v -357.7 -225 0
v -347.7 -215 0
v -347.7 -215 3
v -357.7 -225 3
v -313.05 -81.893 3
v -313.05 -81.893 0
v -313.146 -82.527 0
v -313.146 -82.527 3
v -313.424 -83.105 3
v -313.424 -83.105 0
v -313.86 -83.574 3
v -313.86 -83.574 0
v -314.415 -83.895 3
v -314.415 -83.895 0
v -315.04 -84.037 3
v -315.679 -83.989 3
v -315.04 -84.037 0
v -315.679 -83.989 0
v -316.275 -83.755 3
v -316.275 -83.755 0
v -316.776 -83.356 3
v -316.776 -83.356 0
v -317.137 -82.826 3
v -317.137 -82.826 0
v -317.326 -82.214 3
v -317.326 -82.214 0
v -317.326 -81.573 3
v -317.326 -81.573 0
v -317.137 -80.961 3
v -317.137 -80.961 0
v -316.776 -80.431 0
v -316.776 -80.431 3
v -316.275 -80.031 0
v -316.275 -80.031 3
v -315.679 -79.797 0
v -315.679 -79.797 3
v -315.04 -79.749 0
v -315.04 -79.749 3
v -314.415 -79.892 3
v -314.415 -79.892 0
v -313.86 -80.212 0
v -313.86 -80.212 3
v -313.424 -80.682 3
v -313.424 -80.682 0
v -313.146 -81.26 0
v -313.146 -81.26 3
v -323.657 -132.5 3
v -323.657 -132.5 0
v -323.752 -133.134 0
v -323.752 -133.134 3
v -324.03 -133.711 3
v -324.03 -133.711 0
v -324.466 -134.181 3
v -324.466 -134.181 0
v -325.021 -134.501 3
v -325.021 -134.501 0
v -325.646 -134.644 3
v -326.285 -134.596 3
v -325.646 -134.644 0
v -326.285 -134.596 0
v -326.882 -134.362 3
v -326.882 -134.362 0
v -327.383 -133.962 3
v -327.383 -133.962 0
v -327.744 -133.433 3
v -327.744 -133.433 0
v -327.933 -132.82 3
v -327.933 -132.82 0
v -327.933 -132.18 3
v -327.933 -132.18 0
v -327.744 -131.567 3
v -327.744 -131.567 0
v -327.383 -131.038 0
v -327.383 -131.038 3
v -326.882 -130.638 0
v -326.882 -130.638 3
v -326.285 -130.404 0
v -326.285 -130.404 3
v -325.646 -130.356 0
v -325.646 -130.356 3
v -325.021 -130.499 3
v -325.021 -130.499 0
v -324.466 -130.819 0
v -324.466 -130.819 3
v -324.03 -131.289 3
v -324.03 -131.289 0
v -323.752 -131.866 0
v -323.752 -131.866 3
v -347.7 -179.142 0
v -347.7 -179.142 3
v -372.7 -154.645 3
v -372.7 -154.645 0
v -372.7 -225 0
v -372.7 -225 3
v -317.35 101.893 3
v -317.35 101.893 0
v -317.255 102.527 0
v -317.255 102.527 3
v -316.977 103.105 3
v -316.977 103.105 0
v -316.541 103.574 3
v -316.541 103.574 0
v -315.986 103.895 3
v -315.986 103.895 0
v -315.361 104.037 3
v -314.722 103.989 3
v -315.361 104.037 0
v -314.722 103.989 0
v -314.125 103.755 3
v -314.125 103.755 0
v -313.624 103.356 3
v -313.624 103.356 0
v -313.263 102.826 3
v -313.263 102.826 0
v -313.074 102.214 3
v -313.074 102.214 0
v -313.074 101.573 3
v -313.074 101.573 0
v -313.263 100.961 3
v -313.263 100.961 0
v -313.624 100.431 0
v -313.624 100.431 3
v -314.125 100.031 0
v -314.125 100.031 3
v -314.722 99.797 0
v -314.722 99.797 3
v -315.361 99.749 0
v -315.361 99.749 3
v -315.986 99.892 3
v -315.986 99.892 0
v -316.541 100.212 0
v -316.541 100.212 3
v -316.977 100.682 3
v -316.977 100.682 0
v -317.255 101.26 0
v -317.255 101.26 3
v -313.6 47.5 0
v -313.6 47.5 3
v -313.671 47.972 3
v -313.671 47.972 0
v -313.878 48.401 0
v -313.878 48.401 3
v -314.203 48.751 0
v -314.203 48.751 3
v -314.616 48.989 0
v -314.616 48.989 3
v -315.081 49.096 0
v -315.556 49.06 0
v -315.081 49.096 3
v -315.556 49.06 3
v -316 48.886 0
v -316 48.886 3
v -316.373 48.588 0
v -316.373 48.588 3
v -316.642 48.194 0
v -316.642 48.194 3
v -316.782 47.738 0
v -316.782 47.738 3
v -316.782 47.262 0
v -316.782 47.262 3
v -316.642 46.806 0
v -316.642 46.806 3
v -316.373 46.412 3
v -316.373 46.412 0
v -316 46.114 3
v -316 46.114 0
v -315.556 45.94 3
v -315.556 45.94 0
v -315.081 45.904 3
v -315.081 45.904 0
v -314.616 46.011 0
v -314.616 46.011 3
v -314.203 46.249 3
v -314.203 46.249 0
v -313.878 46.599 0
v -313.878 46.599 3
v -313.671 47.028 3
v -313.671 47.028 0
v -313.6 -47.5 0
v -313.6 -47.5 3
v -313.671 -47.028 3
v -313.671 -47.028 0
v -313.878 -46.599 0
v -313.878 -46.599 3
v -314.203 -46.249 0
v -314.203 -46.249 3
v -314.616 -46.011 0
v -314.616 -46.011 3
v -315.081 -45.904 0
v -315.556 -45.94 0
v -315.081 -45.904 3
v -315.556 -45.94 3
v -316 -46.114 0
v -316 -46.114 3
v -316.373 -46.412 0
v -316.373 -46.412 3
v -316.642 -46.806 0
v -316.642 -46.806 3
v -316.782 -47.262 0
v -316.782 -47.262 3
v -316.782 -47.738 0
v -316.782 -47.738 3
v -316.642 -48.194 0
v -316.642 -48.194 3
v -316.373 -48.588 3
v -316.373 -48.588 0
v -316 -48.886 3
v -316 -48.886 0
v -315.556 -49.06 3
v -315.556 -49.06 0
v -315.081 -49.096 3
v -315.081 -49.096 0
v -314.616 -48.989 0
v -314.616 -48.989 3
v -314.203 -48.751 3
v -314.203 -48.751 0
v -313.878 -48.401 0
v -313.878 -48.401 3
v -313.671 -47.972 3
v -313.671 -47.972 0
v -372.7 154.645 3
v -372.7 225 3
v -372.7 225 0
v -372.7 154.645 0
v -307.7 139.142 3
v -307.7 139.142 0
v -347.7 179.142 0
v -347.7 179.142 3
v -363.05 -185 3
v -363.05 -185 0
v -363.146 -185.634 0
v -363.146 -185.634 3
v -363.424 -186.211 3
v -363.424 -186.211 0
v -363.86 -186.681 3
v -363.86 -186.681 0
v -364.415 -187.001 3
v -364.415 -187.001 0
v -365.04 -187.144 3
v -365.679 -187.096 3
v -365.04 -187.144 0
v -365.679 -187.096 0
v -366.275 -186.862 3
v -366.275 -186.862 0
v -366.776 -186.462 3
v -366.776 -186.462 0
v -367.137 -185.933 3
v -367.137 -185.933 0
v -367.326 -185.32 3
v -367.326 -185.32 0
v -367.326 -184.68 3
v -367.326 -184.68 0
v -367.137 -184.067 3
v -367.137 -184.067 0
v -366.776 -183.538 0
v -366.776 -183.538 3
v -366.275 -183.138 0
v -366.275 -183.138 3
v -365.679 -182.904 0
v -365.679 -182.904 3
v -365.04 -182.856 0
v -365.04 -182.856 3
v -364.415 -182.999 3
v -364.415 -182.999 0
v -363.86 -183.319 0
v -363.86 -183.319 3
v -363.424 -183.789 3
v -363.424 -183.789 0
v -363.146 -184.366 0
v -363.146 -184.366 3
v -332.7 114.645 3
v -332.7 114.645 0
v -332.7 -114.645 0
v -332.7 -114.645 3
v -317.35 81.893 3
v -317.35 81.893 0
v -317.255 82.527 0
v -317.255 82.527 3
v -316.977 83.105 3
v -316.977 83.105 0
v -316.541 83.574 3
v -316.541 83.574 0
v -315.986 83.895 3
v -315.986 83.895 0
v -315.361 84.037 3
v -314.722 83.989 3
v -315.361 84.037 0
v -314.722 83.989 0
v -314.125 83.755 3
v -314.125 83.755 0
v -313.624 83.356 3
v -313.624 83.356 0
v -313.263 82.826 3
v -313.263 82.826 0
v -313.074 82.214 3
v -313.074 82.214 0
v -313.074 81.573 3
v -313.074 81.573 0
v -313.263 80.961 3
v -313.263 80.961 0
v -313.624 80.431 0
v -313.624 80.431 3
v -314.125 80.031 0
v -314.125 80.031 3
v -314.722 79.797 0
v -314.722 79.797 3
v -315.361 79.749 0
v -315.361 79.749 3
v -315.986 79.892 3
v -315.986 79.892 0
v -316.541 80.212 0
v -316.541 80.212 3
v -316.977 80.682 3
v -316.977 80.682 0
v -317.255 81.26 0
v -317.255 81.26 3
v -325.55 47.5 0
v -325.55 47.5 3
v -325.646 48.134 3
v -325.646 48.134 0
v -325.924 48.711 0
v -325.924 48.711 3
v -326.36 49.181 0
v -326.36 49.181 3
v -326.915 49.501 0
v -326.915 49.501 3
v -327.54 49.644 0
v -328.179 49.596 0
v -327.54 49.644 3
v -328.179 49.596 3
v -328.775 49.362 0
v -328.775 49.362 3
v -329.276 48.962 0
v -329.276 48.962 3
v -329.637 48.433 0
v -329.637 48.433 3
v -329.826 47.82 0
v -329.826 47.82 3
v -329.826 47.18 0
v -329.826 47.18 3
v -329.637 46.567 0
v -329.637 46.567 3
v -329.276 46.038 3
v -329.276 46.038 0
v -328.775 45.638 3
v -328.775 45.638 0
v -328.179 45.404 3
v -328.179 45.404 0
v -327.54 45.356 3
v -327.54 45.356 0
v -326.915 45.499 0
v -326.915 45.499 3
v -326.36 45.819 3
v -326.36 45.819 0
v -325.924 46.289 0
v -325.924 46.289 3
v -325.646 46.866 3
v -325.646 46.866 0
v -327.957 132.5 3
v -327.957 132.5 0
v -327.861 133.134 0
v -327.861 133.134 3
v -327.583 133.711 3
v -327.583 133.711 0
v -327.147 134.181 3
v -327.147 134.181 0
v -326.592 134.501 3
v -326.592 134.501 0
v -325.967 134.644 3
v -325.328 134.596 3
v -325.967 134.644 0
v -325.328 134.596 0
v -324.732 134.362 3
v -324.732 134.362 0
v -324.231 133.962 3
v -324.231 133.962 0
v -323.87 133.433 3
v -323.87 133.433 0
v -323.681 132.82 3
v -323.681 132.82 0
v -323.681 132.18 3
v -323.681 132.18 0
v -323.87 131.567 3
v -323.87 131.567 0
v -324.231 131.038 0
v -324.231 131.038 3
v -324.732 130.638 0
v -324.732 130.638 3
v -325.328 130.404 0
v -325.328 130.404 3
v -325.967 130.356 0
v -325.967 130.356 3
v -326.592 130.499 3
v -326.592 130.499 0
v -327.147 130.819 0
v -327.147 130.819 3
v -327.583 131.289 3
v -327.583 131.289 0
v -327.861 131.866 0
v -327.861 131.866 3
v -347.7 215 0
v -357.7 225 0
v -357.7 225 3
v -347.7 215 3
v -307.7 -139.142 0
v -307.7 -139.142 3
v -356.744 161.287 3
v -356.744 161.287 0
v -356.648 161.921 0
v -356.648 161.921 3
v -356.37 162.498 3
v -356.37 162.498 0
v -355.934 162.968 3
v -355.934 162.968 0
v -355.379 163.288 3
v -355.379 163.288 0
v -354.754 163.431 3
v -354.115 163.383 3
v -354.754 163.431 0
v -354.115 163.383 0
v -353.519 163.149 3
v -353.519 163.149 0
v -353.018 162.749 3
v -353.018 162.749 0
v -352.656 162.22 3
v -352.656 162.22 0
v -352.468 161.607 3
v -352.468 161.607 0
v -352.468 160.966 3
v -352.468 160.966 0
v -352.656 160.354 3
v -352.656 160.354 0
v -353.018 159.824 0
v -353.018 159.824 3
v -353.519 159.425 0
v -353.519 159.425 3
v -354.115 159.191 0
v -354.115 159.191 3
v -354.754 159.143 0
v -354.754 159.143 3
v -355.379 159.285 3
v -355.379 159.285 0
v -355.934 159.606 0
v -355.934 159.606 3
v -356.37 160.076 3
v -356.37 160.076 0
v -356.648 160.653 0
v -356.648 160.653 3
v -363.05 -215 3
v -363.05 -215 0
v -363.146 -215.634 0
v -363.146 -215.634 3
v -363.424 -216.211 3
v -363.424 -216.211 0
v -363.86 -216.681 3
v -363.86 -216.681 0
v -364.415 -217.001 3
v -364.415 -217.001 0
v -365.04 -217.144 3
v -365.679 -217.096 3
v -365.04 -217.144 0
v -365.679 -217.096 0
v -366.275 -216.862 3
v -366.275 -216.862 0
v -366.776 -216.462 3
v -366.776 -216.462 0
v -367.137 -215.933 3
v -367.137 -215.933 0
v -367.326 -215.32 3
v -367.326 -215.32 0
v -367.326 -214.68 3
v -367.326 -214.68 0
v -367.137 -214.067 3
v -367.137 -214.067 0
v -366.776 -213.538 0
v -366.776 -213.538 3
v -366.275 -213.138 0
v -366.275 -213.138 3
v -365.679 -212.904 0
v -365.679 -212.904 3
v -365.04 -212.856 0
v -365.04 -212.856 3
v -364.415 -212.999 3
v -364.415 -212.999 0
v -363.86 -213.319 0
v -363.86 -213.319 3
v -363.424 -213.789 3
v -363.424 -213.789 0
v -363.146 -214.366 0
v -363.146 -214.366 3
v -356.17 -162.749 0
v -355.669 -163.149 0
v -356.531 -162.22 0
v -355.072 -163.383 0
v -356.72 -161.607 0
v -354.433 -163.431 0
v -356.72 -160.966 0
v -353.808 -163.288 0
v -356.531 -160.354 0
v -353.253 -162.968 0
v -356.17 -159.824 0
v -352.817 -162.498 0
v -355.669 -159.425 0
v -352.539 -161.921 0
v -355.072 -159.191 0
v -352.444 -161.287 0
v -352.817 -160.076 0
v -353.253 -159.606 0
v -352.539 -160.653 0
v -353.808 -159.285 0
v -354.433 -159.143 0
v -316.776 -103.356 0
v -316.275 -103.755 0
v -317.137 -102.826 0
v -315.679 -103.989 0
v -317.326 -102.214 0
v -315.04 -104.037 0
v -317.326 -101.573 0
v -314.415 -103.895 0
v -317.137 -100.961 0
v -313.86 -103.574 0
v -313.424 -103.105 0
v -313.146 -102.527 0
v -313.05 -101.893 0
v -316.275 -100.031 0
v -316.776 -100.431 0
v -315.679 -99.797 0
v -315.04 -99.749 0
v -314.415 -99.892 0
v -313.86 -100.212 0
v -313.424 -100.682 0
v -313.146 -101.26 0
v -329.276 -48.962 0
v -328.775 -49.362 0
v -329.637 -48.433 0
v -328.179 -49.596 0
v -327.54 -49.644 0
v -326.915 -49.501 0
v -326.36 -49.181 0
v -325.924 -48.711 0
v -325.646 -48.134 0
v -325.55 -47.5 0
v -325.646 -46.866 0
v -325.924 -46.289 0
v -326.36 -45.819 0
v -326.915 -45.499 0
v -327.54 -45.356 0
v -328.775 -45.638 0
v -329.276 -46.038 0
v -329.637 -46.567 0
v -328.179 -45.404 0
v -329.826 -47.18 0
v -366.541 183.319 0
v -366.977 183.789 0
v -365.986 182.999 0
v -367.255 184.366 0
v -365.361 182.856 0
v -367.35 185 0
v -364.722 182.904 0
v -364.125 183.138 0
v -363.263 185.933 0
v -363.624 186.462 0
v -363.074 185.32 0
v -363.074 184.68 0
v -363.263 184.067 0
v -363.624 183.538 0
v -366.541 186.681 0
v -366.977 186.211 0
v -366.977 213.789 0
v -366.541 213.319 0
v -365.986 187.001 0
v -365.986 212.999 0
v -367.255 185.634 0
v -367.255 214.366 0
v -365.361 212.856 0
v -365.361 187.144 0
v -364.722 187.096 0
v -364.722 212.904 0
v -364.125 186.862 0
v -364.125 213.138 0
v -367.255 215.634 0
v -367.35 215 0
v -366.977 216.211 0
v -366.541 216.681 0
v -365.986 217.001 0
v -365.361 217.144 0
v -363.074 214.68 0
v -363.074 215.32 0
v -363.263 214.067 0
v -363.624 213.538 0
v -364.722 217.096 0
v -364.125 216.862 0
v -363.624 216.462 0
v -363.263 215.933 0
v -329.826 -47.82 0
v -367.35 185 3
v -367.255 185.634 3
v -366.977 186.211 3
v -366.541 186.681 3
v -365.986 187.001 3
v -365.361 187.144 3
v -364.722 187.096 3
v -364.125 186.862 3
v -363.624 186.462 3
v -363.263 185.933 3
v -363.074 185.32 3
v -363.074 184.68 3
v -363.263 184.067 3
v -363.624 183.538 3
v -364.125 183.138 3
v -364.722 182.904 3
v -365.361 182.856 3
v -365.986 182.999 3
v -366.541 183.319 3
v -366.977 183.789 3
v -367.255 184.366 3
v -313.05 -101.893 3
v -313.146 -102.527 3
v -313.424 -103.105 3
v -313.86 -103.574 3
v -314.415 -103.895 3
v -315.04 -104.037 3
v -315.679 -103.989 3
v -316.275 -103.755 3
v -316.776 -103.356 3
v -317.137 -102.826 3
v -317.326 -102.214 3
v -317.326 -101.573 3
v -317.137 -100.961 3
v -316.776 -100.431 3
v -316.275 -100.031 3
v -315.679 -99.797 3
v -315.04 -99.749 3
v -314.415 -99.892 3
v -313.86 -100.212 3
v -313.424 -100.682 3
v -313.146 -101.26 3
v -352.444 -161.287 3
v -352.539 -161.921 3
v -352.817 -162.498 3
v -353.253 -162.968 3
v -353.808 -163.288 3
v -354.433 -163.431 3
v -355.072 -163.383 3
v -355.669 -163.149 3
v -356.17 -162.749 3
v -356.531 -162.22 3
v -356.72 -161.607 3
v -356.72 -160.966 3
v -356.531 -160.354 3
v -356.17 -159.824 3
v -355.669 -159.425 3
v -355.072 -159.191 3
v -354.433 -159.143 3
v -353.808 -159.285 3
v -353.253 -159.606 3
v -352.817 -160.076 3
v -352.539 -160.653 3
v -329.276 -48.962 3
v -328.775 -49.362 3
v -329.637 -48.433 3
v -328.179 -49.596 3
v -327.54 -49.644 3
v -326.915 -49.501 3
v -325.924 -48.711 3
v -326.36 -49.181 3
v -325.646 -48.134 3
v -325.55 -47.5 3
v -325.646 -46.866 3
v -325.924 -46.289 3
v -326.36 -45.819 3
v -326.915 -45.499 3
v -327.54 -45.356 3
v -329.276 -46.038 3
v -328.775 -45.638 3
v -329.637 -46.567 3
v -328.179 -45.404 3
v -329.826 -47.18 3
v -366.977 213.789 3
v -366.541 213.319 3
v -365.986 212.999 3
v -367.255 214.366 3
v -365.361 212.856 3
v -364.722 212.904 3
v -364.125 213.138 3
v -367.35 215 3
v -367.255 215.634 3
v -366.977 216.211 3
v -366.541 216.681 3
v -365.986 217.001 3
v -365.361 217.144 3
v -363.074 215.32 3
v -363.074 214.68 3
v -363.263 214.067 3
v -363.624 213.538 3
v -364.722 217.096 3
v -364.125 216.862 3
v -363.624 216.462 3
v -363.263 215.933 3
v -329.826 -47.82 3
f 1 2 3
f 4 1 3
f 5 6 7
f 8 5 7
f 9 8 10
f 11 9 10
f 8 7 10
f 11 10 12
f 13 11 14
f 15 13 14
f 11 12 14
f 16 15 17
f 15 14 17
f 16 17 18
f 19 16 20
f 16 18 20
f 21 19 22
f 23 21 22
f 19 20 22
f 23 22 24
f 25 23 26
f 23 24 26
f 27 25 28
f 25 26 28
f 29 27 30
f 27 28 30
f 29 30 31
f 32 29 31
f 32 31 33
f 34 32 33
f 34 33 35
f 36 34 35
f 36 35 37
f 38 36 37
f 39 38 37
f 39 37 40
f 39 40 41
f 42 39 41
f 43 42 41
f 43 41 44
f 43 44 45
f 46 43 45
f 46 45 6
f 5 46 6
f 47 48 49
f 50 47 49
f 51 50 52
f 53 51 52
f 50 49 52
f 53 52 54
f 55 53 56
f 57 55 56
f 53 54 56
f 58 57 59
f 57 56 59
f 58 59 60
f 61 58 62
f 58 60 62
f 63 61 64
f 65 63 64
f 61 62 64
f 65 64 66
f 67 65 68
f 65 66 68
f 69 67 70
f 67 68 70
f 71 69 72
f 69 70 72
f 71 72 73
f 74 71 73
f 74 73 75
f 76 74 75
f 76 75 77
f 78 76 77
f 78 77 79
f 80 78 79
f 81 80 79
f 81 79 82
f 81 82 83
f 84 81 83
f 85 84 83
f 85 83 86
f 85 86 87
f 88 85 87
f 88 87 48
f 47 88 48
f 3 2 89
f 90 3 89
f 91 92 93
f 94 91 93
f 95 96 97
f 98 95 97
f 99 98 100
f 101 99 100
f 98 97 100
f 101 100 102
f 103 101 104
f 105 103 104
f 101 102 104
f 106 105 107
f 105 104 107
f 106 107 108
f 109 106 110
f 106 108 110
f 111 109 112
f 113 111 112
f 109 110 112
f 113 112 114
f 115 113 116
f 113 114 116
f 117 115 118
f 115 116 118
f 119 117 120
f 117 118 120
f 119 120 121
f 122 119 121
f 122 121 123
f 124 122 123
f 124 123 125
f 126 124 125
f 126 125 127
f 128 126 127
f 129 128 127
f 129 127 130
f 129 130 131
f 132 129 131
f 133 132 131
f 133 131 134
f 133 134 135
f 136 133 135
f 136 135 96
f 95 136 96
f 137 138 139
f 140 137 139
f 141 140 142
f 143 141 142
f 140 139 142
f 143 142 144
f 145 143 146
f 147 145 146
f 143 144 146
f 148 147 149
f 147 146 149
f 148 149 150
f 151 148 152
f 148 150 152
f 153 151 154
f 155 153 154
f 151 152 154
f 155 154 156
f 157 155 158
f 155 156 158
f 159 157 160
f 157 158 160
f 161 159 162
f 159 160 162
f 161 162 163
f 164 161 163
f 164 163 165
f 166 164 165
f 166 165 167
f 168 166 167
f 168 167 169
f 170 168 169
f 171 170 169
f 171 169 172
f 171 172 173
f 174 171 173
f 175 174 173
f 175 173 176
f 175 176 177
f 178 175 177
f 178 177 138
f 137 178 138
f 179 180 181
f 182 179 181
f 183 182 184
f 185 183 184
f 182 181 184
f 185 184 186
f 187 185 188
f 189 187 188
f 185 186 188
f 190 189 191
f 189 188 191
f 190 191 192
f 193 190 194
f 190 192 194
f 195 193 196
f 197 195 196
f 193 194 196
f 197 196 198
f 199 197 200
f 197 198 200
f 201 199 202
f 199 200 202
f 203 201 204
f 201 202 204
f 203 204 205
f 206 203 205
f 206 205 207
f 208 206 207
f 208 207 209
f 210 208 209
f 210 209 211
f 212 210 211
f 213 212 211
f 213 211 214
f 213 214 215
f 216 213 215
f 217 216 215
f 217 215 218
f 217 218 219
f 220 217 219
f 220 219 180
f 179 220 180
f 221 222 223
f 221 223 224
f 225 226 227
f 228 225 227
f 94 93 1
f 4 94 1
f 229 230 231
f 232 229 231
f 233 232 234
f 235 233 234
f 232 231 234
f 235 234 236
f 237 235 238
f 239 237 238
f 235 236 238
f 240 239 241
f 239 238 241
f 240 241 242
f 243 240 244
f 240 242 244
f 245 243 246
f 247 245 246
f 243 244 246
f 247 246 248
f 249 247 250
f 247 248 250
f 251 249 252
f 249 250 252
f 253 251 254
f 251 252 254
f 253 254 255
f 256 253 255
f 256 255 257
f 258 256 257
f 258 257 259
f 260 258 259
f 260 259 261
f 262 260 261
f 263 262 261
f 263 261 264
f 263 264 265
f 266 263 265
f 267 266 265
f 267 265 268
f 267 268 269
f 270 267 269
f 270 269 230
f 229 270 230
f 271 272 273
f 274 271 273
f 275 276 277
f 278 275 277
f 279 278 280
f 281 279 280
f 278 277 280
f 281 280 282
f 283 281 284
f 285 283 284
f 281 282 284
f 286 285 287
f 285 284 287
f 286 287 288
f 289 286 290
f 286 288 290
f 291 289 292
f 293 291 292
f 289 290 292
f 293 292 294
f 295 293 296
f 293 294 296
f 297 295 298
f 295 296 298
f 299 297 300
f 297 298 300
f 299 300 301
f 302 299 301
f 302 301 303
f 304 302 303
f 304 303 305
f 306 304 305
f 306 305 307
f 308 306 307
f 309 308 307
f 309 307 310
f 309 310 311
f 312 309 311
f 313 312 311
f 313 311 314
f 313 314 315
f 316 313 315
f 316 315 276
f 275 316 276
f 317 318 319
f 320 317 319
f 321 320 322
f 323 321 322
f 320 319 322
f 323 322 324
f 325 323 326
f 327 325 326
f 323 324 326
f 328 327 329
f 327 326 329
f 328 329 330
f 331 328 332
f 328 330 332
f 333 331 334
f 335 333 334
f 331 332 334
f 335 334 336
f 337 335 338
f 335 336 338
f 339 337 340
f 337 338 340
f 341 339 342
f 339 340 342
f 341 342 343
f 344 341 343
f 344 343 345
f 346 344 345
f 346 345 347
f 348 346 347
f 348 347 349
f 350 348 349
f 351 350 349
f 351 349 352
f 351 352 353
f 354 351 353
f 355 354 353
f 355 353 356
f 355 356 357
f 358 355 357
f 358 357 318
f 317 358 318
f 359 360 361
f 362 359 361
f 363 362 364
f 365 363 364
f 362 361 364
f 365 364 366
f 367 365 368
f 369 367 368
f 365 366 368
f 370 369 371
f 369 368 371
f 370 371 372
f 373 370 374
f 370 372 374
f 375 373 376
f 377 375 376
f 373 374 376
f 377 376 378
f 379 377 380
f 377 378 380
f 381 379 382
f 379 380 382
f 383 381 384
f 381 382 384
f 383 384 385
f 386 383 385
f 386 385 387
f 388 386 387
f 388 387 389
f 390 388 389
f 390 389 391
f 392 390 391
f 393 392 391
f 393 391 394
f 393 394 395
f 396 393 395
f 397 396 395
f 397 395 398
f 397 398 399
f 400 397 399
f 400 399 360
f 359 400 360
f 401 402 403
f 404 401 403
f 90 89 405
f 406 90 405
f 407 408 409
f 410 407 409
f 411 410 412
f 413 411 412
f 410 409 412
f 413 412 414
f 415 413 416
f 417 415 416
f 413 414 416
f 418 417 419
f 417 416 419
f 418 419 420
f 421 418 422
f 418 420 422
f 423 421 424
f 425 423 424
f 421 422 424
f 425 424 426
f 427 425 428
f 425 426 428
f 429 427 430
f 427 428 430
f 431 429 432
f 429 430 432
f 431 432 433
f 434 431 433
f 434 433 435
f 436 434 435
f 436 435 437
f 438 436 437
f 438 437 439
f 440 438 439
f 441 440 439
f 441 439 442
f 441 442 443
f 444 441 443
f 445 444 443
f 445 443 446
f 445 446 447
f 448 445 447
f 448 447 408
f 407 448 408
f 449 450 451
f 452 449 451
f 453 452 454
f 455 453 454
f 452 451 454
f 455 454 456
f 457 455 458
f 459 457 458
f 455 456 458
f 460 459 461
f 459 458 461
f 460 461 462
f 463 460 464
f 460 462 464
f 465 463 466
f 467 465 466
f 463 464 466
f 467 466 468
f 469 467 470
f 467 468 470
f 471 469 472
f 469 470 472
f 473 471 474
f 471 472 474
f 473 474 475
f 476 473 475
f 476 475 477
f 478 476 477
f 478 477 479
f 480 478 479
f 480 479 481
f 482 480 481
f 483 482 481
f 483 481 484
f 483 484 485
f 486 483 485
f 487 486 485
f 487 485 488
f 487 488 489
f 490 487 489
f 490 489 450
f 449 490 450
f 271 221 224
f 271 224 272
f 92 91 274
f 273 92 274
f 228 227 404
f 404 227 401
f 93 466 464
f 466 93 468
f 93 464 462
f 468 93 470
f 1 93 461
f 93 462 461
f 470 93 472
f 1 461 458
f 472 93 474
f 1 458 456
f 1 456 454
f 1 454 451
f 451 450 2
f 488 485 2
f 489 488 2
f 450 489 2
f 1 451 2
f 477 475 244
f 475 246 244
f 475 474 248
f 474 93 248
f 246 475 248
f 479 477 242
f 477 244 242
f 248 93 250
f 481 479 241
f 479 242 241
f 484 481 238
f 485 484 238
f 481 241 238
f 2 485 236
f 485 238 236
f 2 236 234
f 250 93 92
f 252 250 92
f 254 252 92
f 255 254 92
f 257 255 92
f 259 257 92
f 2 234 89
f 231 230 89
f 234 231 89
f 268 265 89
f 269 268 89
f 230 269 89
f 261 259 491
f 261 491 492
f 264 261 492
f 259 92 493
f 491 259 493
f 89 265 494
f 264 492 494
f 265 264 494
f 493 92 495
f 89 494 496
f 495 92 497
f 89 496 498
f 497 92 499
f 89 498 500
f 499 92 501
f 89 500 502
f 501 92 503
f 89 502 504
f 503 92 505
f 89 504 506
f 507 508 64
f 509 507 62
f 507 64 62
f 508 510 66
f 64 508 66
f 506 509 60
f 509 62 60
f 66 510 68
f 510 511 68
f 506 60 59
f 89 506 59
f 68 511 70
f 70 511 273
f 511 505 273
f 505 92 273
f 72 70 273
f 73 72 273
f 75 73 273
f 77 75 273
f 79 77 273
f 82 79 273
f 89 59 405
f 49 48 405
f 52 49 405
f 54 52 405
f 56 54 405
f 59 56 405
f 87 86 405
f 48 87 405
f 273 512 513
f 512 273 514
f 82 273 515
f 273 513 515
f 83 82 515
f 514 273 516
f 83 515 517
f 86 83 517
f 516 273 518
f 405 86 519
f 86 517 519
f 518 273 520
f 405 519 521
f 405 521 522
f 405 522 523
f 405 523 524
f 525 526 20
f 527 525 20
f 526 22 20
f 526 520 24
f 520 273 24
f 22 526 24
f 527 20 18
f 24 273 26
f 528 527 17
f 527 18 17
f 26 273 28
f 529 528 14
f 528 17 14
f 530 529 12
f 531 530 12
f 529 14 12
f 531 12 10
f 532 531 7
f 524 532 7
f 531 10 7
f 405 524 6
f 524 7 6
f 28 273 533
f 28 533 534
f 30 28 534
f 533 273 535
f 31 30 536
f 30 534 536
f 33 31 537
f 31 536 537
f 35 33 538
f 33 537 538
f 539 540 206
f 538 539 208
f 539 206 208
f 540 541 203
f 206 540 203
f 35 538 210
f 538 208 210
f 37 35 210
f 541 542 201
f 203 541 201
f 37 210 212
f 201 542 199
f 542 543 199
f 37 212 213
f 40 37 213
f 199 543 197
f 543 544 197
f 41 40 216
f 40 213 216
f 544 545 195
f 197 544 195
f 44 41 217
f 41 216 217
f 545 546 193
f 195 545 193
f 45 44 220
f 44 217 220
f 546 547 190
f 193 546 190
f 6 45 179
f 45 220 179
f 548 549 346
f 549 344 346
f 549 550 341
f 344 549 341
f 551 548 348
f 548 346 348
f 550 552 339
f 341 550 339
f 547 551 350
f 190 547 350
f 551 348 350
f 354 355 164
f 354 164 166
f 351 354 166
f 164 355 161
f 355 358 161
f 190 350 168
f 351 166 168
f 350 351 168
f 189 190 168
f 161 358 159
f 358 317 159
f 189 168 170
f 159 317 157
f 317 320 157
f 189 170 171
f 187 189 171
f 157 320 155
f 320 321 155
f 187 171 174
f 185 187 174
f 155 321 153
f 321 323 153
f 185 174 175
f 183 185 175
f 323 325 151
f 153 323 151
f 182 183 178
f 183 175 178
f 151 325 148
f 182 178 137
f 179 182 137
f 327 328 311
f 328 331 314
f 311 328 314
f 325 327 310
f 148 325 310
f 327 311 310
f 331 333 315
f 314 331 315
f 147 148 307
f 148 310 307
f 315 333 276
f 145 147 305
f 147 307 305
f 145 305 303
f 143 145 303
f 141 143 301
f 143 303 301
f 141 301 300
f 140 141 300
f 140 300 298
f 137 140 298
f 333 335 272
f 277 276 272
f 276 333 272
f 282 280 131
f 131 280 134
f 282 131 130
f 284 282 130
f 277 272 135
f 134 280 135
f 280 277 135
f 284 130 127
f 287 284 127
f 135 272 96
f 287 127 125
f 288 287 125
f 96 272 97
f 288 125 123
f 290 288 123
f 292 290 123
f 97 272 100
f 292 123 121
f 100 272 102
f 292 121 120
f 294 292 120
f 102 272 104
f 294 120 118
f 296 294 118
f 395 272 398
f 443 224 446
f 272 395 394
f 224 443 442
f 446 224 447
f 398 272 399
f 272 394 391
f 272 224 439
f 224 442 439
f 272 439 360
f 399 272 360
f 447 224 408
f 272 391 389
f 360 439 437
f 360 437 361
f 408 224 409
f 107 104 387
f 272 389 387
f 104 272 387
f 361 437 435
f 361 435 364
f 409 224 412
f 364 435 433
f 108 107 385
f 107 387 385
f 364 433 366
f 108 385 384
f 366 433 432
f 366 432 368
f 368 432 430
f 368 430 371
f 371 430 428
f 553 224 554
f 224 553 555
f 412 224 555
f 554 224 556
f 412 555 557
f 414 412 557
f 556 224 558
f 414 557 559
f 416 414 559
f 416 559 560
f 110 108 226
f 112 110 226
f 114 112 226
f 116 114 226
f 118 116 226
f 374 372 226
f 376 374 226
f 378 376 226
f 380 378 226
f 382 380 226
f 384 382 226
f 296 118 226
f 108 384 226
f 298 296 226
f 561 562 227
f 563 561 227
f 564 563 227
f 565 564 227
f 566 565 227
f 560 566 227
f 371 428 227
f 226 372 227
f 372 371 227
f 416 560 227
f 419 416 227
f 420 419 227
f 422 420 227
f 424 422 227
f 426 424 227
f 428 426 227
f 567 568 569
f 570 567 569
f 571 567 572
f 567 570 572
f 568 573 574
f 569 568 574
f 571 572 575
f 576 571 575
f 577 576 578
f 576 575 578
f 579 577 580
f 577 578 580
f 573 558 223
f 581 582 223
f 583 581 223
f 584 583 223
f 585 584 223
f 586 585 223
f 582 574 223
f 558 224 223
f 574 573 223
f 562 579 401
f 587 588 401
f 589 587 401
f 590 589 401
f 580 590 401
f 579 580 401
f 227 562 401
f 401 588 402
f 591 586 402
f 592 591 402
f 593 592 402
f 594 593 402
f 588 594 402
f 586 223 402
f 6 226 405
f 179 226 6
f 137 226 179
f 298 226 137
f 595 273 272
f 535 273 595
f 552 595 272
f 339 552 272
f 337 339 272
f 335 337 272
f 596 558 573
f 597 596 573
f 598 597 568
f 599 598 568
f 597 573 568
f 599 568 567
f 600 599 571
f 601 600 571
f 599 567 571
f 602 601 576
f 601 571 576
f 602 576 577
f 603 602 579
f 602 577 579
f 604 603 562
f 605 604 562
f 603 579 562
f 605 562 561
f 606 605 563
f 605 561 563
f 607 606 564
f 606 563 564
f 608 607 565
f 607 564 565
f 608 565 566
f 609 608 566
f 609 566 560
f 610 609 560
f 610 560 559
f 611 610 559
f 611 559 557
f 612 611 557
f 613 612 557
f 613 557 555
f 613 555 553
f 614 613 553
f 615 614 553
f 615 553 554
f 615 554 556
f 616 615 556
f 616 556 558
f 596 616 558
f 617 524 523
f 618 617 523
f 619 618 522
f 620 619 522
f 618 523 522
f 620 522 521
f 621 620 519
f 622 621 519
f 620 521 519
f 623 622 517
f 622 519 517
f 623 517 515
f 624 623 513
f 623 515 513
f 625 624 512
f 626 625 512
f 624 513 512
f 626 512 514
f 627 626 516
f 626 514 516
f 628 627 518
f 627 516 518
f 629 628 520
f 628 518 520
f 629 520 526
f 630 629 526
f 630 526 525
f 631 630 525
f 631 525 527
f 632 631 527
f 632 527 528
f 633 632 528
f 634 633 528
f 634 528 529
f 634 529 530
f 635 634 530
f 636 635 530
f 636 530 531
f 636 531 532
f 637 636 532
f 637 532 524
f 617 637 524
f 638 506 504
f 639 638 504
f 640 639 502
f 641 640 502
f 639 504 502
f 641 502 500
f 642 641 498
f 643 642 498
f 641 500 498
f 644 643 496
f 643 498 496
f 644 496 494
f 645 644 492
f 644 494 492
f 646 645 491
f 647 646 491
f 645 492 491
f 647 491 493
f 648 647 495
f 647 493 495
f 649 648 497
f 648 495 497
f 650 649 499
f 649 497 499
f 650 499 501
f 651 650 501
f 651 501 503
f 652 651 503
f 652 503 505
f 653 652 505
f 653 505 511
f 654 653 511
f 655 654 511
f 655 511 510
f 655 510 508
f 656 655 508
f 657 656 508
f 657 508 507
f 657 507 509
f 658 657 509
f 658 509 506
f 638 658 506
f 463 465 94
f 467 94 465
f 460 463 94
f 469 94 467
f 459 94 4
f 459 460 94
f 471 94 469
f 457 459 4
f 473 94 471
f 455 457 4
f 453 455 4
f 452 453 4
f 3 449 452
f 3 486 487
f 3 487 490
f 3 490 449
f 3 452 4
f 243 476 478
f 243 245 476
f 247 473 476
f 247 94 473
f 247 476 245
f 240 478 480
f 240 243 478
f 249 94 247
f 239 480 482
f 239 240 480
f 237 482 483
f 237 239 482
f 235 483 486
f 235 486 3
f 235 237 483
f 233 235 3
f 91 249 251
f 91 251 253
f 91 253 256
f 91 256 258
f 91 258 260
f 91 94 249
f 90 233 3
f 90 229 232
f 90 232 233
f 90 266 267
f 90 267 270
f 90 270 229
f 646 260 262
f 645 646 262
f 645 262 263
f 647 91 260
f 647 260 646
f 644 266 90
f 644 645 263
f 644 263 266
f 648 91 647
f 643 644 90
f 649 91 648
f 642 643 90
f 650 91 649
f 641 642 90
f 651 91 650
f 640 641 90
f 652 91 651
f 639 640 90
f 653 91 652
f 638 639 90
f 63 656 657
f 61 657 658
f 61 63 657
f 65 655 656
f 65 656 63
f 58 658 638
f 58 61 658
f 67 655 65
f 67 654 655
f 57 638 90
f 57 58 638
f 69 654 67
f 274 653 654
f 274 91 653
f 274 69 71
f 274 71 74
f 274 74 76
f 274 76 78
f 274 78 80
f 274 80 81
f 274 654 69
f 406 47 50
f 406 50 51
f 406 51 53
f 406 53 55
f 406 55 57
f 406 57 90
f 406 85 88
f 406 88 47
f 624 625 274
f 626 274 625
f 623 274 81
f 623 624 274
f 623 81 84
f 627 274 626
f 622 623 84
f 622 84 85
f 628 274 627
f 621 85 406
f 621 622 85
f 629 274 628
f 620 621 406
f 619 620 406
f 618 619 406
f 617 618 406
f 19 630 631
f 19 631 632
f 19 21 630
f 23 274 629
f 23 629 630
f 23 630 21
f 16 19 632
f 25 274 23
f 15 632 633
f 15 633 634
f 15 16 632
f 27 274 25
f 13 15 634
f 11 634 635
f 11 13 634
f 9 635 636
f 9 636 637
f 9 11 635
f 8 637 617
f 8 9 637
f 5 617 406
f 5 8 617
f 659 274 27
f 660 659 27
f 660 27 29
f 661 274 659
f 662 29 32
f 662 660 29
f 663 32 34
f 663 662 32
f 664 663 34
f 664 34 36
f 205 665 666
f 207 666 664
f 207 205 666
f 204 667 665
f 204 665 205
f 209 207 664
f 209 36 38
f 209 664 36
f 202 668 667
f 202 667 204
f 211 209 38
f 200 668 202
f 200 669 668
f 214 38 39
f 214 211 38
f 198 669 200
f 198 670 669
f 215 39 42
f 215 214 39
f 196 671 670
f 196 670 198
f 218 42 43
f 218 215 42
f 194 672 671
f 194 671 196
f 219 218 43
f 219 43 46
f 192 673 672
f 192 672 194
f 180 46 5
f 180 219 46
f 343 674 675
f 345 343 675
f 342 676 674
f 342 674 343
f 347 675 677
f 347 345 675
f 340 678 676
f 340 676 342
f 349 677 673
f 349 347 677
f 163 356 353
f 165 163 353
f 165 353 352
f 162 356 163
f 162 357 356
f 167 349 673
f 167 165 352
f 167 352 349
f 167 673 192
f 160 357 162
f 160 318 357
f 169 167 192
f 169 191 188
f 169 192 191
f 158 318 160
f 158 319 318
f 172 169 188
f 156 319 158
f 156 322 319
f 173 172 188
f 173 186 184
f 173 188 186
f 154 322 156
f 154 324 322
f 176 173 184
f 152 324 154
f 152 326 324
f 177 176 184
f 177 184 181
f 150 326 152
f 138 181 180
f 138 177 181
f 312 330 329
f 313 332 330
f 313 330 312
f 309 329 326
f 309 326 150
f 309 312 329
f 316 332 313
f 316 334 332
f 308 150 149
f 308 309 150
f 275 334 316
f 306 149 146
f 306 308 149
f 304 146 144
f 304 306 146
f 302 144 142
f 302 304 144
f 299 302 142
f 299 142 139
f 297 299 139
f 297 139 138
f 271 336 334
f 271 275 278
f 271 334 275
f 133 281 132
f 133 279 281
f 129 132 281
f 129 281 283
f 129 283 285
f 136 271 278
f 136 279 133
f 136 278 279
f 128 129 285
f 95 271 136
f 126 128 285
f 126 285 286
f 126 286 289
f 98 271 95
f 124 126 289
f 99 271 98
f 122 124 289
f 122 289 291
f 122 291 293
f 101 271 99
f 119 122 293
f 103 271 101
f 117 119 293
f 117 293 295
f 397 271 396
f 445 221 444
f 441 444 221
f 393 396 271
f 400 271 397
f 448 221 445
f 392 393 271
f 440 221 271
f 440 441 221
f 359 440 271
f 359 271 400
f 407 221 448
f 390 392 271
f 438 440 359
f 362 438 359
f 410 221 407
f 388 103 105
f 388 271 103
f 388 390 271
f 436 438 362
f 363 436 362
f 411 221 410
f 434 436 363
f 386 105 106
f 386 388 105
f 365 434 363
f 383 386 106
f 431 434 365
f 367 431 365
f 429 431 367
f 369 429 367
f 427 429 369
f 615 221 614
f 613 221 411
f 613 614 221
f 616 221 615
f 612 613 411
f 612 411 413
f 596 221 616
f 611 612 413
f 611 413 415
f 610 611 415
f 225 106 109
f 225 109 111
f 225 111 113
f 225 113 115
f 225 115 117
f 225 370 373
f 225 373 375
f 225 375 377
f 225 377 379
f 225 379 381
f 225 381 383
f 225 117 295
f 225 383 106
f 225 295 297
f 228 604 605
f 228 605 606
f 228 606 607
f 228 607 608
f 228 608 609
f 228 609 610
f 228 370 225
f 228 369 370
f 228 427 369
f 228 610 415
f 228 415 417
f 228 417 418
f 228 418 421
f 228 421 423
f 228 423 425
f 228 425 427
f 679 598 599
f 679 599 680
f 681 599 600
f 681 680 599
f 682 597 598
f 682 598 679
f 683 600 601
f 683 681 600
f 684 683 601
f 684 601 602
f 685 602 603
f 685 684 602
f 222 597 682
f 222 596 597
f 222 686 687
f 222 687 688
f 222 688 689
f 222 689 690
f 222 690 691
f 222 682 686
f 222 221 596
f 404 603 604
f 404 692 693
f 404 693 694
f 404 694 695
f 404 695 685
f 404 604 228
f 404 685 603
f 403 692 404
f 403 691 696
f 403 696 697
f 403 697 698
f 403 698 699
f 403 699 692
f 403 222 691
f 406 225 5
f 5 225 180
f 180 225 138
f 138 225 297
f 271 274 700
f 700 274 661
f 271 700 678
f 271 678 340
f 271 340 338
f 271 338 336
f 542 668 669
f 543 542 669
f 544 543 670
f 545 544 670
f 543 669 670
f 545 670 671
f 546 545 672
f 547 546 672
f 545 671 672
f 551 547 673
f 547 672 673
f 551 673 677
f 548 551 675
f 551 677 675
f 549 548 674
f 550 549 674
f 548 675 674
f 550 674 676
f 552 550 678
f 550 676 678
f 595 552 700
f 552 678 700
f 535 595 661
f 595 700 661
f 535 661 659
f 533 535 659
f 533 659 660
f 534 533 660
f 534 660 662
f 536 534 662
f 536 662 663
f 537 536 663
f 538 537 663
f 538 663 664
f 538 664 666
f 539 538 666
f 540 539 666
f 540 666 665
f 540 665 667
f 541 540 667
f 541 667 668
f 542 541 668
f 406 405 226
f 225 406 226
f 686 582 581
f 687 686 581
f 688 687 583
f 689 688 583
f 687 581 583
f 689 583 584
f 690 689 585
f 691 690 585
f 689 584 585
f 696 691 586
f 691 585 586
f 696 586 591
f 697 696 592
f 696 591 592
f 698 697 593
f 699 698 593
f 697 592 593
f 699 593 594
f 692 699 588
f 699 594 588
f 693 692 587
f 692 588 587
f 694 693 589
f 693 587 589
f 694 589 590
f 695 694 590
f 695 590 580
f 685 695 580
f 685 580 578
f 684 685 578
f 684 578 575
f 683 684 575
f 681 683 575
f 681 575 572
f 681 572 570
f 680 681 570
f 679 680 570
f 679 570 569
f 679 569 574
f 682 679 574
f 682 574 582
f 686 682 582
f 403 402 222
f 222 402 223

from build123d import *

# Parameters (mm, degrees)
BOSS_EXTRUDE1_DEPTH = 3
BOSS_EXTRUDE2_DEPTH = 3
CHAMFER1_SIZE       = 10
SKETCH3_R           = 2.15
SKETCH3_R_2         = 1.6
CUT_EXTRUDE1_DEPTH  = 10
SKETCH4_R           = 2.15
CUT_EXTRUDE2_DEPTH  = 10


with BuildPart() as part:
    # Sketch1 → Boss-Extrude1 (new body)
    with BuildSketch(Plane.XY):
        Polygon((-372.700177837, -225), (-357.700177837, -225), (-347.700177837, -225), (-347.700177837, -179.142135624), (-307.700177837, -139.142135624), (-307.700177837, -125), (-307.700177837, 125), (-307.700177837, 139.142135624), (-347.700177837, 179.142135624), (-347.700177837, 225), (-357.700177837, 225), (-372.700177837, 225), (-372.700177837, 168.786796564), (-332.700177837, 128.786796564), (-332.700177837, -128.786796564), (-372.700177837, -168.786796564), align=None)
    extrude(amount=BOSS_EXTRUDE1_DEPTH)

    # Sketch2 → Boss-Extrude2 (add)
    with BuildSketch(Plane.XY.offset(3)):
        Polygon((-372.700177837, 168.786796564), (-372.700177837, 154.644660941), (-332.700177837, 114.644660941), (-332.700177837, 128.786796564), align=None)
        Polygon((-372.700177837, -168.786796564), (-372.700177837, -154.644660941), (-332.700177837, -114.644660941), (-332.700177837, -128.786796564), align=None)
    extrude(amount=-BOSS_EXTRUDE2_DEPTH)

    # Chamfer1
    chamfer1_edges = [part.edges().sort_by_distance(p)[0] for p in [
        (-347.700177837, 225, 1.5),
        (-347.700177837, -225, 1.5),
    ]]
    chamfer(chamfer1_edges, length=CHAMFER1_SIZE)

    # Sketch3 → Cut-Extrude1 (cut)
    with BuildSketch(Plane.XY.offset(3)):
        with Locations((-327.700177837, 47.5)):
            Circle(SKETCH3_R)
        with Locations((-315.200177837, 47.5)):
            Circle(SKETCH3_R_2)
        with Locations((-327.700177837, -47.5)):
            Circle(SKETCH3_R)
        with Locations((-315.200177837, -47.5)):
            Circle(SKETCH3_R_2)
    extrude(amount=-CUT_EXTRUDE1_DEPTH, mode=Mode.SUBTRACT)

    # Sketch4 → Cut-Extrude2 (cut)
    with BuildSketch(Plane(origin=(0, 0, 0), x_dir=(-1, 0, 0), z_dir=(0, 0, -1))):
        with Locations((365.200177837, 215)):
            Circle(SKETCH4_R)
        with Locations((365.200177837, 185)):
            Circle(SKETCH4_R)
        with Locations((354.593576119, 161.286796564)):
            Circle(SKETCH4_R)
        with Locations((325.806779555, 132.5)):
            Circle(SKETCH4_R)
        with Locations((315.200177837, 101.893398282)):
            Circle(SKETCH4_R)
        with Locations((315.200177837, 81.893398282)):
            Circle(SKETCH4_R)
        with Locations(Location((315.200177837, -81.893398282, 0), (0, 0, 180))):
            Circle(SKETCH4_R)
        with Locations(Location((315.200177837, -101.893398282, 0), (0, 0, 180))):
            Circle(SKETCH4_R)
        with Locations(Location((325.806779555, -132.5, 0), (0, 0, 180))):
            Circle(SKETCH4_R)
        with Locations(Location((354.593576119, -161.286796564, 0), (0, 0, 180))):
            Circle(SKETCH4_R)
        with Locations(Location((365.200177837, -185, 0), (0, 0, 180))):
            Circle(SKETCH4_R)
        with Locations(Location((365.200177837, -215, 0), (0, 0, 180))):
            Circle(SKETCH4_R)
    extrude(amount=-CUT_EXTRUDE2_DEPTH, mode=Mode.SUBTRACT)


solid = part.part
